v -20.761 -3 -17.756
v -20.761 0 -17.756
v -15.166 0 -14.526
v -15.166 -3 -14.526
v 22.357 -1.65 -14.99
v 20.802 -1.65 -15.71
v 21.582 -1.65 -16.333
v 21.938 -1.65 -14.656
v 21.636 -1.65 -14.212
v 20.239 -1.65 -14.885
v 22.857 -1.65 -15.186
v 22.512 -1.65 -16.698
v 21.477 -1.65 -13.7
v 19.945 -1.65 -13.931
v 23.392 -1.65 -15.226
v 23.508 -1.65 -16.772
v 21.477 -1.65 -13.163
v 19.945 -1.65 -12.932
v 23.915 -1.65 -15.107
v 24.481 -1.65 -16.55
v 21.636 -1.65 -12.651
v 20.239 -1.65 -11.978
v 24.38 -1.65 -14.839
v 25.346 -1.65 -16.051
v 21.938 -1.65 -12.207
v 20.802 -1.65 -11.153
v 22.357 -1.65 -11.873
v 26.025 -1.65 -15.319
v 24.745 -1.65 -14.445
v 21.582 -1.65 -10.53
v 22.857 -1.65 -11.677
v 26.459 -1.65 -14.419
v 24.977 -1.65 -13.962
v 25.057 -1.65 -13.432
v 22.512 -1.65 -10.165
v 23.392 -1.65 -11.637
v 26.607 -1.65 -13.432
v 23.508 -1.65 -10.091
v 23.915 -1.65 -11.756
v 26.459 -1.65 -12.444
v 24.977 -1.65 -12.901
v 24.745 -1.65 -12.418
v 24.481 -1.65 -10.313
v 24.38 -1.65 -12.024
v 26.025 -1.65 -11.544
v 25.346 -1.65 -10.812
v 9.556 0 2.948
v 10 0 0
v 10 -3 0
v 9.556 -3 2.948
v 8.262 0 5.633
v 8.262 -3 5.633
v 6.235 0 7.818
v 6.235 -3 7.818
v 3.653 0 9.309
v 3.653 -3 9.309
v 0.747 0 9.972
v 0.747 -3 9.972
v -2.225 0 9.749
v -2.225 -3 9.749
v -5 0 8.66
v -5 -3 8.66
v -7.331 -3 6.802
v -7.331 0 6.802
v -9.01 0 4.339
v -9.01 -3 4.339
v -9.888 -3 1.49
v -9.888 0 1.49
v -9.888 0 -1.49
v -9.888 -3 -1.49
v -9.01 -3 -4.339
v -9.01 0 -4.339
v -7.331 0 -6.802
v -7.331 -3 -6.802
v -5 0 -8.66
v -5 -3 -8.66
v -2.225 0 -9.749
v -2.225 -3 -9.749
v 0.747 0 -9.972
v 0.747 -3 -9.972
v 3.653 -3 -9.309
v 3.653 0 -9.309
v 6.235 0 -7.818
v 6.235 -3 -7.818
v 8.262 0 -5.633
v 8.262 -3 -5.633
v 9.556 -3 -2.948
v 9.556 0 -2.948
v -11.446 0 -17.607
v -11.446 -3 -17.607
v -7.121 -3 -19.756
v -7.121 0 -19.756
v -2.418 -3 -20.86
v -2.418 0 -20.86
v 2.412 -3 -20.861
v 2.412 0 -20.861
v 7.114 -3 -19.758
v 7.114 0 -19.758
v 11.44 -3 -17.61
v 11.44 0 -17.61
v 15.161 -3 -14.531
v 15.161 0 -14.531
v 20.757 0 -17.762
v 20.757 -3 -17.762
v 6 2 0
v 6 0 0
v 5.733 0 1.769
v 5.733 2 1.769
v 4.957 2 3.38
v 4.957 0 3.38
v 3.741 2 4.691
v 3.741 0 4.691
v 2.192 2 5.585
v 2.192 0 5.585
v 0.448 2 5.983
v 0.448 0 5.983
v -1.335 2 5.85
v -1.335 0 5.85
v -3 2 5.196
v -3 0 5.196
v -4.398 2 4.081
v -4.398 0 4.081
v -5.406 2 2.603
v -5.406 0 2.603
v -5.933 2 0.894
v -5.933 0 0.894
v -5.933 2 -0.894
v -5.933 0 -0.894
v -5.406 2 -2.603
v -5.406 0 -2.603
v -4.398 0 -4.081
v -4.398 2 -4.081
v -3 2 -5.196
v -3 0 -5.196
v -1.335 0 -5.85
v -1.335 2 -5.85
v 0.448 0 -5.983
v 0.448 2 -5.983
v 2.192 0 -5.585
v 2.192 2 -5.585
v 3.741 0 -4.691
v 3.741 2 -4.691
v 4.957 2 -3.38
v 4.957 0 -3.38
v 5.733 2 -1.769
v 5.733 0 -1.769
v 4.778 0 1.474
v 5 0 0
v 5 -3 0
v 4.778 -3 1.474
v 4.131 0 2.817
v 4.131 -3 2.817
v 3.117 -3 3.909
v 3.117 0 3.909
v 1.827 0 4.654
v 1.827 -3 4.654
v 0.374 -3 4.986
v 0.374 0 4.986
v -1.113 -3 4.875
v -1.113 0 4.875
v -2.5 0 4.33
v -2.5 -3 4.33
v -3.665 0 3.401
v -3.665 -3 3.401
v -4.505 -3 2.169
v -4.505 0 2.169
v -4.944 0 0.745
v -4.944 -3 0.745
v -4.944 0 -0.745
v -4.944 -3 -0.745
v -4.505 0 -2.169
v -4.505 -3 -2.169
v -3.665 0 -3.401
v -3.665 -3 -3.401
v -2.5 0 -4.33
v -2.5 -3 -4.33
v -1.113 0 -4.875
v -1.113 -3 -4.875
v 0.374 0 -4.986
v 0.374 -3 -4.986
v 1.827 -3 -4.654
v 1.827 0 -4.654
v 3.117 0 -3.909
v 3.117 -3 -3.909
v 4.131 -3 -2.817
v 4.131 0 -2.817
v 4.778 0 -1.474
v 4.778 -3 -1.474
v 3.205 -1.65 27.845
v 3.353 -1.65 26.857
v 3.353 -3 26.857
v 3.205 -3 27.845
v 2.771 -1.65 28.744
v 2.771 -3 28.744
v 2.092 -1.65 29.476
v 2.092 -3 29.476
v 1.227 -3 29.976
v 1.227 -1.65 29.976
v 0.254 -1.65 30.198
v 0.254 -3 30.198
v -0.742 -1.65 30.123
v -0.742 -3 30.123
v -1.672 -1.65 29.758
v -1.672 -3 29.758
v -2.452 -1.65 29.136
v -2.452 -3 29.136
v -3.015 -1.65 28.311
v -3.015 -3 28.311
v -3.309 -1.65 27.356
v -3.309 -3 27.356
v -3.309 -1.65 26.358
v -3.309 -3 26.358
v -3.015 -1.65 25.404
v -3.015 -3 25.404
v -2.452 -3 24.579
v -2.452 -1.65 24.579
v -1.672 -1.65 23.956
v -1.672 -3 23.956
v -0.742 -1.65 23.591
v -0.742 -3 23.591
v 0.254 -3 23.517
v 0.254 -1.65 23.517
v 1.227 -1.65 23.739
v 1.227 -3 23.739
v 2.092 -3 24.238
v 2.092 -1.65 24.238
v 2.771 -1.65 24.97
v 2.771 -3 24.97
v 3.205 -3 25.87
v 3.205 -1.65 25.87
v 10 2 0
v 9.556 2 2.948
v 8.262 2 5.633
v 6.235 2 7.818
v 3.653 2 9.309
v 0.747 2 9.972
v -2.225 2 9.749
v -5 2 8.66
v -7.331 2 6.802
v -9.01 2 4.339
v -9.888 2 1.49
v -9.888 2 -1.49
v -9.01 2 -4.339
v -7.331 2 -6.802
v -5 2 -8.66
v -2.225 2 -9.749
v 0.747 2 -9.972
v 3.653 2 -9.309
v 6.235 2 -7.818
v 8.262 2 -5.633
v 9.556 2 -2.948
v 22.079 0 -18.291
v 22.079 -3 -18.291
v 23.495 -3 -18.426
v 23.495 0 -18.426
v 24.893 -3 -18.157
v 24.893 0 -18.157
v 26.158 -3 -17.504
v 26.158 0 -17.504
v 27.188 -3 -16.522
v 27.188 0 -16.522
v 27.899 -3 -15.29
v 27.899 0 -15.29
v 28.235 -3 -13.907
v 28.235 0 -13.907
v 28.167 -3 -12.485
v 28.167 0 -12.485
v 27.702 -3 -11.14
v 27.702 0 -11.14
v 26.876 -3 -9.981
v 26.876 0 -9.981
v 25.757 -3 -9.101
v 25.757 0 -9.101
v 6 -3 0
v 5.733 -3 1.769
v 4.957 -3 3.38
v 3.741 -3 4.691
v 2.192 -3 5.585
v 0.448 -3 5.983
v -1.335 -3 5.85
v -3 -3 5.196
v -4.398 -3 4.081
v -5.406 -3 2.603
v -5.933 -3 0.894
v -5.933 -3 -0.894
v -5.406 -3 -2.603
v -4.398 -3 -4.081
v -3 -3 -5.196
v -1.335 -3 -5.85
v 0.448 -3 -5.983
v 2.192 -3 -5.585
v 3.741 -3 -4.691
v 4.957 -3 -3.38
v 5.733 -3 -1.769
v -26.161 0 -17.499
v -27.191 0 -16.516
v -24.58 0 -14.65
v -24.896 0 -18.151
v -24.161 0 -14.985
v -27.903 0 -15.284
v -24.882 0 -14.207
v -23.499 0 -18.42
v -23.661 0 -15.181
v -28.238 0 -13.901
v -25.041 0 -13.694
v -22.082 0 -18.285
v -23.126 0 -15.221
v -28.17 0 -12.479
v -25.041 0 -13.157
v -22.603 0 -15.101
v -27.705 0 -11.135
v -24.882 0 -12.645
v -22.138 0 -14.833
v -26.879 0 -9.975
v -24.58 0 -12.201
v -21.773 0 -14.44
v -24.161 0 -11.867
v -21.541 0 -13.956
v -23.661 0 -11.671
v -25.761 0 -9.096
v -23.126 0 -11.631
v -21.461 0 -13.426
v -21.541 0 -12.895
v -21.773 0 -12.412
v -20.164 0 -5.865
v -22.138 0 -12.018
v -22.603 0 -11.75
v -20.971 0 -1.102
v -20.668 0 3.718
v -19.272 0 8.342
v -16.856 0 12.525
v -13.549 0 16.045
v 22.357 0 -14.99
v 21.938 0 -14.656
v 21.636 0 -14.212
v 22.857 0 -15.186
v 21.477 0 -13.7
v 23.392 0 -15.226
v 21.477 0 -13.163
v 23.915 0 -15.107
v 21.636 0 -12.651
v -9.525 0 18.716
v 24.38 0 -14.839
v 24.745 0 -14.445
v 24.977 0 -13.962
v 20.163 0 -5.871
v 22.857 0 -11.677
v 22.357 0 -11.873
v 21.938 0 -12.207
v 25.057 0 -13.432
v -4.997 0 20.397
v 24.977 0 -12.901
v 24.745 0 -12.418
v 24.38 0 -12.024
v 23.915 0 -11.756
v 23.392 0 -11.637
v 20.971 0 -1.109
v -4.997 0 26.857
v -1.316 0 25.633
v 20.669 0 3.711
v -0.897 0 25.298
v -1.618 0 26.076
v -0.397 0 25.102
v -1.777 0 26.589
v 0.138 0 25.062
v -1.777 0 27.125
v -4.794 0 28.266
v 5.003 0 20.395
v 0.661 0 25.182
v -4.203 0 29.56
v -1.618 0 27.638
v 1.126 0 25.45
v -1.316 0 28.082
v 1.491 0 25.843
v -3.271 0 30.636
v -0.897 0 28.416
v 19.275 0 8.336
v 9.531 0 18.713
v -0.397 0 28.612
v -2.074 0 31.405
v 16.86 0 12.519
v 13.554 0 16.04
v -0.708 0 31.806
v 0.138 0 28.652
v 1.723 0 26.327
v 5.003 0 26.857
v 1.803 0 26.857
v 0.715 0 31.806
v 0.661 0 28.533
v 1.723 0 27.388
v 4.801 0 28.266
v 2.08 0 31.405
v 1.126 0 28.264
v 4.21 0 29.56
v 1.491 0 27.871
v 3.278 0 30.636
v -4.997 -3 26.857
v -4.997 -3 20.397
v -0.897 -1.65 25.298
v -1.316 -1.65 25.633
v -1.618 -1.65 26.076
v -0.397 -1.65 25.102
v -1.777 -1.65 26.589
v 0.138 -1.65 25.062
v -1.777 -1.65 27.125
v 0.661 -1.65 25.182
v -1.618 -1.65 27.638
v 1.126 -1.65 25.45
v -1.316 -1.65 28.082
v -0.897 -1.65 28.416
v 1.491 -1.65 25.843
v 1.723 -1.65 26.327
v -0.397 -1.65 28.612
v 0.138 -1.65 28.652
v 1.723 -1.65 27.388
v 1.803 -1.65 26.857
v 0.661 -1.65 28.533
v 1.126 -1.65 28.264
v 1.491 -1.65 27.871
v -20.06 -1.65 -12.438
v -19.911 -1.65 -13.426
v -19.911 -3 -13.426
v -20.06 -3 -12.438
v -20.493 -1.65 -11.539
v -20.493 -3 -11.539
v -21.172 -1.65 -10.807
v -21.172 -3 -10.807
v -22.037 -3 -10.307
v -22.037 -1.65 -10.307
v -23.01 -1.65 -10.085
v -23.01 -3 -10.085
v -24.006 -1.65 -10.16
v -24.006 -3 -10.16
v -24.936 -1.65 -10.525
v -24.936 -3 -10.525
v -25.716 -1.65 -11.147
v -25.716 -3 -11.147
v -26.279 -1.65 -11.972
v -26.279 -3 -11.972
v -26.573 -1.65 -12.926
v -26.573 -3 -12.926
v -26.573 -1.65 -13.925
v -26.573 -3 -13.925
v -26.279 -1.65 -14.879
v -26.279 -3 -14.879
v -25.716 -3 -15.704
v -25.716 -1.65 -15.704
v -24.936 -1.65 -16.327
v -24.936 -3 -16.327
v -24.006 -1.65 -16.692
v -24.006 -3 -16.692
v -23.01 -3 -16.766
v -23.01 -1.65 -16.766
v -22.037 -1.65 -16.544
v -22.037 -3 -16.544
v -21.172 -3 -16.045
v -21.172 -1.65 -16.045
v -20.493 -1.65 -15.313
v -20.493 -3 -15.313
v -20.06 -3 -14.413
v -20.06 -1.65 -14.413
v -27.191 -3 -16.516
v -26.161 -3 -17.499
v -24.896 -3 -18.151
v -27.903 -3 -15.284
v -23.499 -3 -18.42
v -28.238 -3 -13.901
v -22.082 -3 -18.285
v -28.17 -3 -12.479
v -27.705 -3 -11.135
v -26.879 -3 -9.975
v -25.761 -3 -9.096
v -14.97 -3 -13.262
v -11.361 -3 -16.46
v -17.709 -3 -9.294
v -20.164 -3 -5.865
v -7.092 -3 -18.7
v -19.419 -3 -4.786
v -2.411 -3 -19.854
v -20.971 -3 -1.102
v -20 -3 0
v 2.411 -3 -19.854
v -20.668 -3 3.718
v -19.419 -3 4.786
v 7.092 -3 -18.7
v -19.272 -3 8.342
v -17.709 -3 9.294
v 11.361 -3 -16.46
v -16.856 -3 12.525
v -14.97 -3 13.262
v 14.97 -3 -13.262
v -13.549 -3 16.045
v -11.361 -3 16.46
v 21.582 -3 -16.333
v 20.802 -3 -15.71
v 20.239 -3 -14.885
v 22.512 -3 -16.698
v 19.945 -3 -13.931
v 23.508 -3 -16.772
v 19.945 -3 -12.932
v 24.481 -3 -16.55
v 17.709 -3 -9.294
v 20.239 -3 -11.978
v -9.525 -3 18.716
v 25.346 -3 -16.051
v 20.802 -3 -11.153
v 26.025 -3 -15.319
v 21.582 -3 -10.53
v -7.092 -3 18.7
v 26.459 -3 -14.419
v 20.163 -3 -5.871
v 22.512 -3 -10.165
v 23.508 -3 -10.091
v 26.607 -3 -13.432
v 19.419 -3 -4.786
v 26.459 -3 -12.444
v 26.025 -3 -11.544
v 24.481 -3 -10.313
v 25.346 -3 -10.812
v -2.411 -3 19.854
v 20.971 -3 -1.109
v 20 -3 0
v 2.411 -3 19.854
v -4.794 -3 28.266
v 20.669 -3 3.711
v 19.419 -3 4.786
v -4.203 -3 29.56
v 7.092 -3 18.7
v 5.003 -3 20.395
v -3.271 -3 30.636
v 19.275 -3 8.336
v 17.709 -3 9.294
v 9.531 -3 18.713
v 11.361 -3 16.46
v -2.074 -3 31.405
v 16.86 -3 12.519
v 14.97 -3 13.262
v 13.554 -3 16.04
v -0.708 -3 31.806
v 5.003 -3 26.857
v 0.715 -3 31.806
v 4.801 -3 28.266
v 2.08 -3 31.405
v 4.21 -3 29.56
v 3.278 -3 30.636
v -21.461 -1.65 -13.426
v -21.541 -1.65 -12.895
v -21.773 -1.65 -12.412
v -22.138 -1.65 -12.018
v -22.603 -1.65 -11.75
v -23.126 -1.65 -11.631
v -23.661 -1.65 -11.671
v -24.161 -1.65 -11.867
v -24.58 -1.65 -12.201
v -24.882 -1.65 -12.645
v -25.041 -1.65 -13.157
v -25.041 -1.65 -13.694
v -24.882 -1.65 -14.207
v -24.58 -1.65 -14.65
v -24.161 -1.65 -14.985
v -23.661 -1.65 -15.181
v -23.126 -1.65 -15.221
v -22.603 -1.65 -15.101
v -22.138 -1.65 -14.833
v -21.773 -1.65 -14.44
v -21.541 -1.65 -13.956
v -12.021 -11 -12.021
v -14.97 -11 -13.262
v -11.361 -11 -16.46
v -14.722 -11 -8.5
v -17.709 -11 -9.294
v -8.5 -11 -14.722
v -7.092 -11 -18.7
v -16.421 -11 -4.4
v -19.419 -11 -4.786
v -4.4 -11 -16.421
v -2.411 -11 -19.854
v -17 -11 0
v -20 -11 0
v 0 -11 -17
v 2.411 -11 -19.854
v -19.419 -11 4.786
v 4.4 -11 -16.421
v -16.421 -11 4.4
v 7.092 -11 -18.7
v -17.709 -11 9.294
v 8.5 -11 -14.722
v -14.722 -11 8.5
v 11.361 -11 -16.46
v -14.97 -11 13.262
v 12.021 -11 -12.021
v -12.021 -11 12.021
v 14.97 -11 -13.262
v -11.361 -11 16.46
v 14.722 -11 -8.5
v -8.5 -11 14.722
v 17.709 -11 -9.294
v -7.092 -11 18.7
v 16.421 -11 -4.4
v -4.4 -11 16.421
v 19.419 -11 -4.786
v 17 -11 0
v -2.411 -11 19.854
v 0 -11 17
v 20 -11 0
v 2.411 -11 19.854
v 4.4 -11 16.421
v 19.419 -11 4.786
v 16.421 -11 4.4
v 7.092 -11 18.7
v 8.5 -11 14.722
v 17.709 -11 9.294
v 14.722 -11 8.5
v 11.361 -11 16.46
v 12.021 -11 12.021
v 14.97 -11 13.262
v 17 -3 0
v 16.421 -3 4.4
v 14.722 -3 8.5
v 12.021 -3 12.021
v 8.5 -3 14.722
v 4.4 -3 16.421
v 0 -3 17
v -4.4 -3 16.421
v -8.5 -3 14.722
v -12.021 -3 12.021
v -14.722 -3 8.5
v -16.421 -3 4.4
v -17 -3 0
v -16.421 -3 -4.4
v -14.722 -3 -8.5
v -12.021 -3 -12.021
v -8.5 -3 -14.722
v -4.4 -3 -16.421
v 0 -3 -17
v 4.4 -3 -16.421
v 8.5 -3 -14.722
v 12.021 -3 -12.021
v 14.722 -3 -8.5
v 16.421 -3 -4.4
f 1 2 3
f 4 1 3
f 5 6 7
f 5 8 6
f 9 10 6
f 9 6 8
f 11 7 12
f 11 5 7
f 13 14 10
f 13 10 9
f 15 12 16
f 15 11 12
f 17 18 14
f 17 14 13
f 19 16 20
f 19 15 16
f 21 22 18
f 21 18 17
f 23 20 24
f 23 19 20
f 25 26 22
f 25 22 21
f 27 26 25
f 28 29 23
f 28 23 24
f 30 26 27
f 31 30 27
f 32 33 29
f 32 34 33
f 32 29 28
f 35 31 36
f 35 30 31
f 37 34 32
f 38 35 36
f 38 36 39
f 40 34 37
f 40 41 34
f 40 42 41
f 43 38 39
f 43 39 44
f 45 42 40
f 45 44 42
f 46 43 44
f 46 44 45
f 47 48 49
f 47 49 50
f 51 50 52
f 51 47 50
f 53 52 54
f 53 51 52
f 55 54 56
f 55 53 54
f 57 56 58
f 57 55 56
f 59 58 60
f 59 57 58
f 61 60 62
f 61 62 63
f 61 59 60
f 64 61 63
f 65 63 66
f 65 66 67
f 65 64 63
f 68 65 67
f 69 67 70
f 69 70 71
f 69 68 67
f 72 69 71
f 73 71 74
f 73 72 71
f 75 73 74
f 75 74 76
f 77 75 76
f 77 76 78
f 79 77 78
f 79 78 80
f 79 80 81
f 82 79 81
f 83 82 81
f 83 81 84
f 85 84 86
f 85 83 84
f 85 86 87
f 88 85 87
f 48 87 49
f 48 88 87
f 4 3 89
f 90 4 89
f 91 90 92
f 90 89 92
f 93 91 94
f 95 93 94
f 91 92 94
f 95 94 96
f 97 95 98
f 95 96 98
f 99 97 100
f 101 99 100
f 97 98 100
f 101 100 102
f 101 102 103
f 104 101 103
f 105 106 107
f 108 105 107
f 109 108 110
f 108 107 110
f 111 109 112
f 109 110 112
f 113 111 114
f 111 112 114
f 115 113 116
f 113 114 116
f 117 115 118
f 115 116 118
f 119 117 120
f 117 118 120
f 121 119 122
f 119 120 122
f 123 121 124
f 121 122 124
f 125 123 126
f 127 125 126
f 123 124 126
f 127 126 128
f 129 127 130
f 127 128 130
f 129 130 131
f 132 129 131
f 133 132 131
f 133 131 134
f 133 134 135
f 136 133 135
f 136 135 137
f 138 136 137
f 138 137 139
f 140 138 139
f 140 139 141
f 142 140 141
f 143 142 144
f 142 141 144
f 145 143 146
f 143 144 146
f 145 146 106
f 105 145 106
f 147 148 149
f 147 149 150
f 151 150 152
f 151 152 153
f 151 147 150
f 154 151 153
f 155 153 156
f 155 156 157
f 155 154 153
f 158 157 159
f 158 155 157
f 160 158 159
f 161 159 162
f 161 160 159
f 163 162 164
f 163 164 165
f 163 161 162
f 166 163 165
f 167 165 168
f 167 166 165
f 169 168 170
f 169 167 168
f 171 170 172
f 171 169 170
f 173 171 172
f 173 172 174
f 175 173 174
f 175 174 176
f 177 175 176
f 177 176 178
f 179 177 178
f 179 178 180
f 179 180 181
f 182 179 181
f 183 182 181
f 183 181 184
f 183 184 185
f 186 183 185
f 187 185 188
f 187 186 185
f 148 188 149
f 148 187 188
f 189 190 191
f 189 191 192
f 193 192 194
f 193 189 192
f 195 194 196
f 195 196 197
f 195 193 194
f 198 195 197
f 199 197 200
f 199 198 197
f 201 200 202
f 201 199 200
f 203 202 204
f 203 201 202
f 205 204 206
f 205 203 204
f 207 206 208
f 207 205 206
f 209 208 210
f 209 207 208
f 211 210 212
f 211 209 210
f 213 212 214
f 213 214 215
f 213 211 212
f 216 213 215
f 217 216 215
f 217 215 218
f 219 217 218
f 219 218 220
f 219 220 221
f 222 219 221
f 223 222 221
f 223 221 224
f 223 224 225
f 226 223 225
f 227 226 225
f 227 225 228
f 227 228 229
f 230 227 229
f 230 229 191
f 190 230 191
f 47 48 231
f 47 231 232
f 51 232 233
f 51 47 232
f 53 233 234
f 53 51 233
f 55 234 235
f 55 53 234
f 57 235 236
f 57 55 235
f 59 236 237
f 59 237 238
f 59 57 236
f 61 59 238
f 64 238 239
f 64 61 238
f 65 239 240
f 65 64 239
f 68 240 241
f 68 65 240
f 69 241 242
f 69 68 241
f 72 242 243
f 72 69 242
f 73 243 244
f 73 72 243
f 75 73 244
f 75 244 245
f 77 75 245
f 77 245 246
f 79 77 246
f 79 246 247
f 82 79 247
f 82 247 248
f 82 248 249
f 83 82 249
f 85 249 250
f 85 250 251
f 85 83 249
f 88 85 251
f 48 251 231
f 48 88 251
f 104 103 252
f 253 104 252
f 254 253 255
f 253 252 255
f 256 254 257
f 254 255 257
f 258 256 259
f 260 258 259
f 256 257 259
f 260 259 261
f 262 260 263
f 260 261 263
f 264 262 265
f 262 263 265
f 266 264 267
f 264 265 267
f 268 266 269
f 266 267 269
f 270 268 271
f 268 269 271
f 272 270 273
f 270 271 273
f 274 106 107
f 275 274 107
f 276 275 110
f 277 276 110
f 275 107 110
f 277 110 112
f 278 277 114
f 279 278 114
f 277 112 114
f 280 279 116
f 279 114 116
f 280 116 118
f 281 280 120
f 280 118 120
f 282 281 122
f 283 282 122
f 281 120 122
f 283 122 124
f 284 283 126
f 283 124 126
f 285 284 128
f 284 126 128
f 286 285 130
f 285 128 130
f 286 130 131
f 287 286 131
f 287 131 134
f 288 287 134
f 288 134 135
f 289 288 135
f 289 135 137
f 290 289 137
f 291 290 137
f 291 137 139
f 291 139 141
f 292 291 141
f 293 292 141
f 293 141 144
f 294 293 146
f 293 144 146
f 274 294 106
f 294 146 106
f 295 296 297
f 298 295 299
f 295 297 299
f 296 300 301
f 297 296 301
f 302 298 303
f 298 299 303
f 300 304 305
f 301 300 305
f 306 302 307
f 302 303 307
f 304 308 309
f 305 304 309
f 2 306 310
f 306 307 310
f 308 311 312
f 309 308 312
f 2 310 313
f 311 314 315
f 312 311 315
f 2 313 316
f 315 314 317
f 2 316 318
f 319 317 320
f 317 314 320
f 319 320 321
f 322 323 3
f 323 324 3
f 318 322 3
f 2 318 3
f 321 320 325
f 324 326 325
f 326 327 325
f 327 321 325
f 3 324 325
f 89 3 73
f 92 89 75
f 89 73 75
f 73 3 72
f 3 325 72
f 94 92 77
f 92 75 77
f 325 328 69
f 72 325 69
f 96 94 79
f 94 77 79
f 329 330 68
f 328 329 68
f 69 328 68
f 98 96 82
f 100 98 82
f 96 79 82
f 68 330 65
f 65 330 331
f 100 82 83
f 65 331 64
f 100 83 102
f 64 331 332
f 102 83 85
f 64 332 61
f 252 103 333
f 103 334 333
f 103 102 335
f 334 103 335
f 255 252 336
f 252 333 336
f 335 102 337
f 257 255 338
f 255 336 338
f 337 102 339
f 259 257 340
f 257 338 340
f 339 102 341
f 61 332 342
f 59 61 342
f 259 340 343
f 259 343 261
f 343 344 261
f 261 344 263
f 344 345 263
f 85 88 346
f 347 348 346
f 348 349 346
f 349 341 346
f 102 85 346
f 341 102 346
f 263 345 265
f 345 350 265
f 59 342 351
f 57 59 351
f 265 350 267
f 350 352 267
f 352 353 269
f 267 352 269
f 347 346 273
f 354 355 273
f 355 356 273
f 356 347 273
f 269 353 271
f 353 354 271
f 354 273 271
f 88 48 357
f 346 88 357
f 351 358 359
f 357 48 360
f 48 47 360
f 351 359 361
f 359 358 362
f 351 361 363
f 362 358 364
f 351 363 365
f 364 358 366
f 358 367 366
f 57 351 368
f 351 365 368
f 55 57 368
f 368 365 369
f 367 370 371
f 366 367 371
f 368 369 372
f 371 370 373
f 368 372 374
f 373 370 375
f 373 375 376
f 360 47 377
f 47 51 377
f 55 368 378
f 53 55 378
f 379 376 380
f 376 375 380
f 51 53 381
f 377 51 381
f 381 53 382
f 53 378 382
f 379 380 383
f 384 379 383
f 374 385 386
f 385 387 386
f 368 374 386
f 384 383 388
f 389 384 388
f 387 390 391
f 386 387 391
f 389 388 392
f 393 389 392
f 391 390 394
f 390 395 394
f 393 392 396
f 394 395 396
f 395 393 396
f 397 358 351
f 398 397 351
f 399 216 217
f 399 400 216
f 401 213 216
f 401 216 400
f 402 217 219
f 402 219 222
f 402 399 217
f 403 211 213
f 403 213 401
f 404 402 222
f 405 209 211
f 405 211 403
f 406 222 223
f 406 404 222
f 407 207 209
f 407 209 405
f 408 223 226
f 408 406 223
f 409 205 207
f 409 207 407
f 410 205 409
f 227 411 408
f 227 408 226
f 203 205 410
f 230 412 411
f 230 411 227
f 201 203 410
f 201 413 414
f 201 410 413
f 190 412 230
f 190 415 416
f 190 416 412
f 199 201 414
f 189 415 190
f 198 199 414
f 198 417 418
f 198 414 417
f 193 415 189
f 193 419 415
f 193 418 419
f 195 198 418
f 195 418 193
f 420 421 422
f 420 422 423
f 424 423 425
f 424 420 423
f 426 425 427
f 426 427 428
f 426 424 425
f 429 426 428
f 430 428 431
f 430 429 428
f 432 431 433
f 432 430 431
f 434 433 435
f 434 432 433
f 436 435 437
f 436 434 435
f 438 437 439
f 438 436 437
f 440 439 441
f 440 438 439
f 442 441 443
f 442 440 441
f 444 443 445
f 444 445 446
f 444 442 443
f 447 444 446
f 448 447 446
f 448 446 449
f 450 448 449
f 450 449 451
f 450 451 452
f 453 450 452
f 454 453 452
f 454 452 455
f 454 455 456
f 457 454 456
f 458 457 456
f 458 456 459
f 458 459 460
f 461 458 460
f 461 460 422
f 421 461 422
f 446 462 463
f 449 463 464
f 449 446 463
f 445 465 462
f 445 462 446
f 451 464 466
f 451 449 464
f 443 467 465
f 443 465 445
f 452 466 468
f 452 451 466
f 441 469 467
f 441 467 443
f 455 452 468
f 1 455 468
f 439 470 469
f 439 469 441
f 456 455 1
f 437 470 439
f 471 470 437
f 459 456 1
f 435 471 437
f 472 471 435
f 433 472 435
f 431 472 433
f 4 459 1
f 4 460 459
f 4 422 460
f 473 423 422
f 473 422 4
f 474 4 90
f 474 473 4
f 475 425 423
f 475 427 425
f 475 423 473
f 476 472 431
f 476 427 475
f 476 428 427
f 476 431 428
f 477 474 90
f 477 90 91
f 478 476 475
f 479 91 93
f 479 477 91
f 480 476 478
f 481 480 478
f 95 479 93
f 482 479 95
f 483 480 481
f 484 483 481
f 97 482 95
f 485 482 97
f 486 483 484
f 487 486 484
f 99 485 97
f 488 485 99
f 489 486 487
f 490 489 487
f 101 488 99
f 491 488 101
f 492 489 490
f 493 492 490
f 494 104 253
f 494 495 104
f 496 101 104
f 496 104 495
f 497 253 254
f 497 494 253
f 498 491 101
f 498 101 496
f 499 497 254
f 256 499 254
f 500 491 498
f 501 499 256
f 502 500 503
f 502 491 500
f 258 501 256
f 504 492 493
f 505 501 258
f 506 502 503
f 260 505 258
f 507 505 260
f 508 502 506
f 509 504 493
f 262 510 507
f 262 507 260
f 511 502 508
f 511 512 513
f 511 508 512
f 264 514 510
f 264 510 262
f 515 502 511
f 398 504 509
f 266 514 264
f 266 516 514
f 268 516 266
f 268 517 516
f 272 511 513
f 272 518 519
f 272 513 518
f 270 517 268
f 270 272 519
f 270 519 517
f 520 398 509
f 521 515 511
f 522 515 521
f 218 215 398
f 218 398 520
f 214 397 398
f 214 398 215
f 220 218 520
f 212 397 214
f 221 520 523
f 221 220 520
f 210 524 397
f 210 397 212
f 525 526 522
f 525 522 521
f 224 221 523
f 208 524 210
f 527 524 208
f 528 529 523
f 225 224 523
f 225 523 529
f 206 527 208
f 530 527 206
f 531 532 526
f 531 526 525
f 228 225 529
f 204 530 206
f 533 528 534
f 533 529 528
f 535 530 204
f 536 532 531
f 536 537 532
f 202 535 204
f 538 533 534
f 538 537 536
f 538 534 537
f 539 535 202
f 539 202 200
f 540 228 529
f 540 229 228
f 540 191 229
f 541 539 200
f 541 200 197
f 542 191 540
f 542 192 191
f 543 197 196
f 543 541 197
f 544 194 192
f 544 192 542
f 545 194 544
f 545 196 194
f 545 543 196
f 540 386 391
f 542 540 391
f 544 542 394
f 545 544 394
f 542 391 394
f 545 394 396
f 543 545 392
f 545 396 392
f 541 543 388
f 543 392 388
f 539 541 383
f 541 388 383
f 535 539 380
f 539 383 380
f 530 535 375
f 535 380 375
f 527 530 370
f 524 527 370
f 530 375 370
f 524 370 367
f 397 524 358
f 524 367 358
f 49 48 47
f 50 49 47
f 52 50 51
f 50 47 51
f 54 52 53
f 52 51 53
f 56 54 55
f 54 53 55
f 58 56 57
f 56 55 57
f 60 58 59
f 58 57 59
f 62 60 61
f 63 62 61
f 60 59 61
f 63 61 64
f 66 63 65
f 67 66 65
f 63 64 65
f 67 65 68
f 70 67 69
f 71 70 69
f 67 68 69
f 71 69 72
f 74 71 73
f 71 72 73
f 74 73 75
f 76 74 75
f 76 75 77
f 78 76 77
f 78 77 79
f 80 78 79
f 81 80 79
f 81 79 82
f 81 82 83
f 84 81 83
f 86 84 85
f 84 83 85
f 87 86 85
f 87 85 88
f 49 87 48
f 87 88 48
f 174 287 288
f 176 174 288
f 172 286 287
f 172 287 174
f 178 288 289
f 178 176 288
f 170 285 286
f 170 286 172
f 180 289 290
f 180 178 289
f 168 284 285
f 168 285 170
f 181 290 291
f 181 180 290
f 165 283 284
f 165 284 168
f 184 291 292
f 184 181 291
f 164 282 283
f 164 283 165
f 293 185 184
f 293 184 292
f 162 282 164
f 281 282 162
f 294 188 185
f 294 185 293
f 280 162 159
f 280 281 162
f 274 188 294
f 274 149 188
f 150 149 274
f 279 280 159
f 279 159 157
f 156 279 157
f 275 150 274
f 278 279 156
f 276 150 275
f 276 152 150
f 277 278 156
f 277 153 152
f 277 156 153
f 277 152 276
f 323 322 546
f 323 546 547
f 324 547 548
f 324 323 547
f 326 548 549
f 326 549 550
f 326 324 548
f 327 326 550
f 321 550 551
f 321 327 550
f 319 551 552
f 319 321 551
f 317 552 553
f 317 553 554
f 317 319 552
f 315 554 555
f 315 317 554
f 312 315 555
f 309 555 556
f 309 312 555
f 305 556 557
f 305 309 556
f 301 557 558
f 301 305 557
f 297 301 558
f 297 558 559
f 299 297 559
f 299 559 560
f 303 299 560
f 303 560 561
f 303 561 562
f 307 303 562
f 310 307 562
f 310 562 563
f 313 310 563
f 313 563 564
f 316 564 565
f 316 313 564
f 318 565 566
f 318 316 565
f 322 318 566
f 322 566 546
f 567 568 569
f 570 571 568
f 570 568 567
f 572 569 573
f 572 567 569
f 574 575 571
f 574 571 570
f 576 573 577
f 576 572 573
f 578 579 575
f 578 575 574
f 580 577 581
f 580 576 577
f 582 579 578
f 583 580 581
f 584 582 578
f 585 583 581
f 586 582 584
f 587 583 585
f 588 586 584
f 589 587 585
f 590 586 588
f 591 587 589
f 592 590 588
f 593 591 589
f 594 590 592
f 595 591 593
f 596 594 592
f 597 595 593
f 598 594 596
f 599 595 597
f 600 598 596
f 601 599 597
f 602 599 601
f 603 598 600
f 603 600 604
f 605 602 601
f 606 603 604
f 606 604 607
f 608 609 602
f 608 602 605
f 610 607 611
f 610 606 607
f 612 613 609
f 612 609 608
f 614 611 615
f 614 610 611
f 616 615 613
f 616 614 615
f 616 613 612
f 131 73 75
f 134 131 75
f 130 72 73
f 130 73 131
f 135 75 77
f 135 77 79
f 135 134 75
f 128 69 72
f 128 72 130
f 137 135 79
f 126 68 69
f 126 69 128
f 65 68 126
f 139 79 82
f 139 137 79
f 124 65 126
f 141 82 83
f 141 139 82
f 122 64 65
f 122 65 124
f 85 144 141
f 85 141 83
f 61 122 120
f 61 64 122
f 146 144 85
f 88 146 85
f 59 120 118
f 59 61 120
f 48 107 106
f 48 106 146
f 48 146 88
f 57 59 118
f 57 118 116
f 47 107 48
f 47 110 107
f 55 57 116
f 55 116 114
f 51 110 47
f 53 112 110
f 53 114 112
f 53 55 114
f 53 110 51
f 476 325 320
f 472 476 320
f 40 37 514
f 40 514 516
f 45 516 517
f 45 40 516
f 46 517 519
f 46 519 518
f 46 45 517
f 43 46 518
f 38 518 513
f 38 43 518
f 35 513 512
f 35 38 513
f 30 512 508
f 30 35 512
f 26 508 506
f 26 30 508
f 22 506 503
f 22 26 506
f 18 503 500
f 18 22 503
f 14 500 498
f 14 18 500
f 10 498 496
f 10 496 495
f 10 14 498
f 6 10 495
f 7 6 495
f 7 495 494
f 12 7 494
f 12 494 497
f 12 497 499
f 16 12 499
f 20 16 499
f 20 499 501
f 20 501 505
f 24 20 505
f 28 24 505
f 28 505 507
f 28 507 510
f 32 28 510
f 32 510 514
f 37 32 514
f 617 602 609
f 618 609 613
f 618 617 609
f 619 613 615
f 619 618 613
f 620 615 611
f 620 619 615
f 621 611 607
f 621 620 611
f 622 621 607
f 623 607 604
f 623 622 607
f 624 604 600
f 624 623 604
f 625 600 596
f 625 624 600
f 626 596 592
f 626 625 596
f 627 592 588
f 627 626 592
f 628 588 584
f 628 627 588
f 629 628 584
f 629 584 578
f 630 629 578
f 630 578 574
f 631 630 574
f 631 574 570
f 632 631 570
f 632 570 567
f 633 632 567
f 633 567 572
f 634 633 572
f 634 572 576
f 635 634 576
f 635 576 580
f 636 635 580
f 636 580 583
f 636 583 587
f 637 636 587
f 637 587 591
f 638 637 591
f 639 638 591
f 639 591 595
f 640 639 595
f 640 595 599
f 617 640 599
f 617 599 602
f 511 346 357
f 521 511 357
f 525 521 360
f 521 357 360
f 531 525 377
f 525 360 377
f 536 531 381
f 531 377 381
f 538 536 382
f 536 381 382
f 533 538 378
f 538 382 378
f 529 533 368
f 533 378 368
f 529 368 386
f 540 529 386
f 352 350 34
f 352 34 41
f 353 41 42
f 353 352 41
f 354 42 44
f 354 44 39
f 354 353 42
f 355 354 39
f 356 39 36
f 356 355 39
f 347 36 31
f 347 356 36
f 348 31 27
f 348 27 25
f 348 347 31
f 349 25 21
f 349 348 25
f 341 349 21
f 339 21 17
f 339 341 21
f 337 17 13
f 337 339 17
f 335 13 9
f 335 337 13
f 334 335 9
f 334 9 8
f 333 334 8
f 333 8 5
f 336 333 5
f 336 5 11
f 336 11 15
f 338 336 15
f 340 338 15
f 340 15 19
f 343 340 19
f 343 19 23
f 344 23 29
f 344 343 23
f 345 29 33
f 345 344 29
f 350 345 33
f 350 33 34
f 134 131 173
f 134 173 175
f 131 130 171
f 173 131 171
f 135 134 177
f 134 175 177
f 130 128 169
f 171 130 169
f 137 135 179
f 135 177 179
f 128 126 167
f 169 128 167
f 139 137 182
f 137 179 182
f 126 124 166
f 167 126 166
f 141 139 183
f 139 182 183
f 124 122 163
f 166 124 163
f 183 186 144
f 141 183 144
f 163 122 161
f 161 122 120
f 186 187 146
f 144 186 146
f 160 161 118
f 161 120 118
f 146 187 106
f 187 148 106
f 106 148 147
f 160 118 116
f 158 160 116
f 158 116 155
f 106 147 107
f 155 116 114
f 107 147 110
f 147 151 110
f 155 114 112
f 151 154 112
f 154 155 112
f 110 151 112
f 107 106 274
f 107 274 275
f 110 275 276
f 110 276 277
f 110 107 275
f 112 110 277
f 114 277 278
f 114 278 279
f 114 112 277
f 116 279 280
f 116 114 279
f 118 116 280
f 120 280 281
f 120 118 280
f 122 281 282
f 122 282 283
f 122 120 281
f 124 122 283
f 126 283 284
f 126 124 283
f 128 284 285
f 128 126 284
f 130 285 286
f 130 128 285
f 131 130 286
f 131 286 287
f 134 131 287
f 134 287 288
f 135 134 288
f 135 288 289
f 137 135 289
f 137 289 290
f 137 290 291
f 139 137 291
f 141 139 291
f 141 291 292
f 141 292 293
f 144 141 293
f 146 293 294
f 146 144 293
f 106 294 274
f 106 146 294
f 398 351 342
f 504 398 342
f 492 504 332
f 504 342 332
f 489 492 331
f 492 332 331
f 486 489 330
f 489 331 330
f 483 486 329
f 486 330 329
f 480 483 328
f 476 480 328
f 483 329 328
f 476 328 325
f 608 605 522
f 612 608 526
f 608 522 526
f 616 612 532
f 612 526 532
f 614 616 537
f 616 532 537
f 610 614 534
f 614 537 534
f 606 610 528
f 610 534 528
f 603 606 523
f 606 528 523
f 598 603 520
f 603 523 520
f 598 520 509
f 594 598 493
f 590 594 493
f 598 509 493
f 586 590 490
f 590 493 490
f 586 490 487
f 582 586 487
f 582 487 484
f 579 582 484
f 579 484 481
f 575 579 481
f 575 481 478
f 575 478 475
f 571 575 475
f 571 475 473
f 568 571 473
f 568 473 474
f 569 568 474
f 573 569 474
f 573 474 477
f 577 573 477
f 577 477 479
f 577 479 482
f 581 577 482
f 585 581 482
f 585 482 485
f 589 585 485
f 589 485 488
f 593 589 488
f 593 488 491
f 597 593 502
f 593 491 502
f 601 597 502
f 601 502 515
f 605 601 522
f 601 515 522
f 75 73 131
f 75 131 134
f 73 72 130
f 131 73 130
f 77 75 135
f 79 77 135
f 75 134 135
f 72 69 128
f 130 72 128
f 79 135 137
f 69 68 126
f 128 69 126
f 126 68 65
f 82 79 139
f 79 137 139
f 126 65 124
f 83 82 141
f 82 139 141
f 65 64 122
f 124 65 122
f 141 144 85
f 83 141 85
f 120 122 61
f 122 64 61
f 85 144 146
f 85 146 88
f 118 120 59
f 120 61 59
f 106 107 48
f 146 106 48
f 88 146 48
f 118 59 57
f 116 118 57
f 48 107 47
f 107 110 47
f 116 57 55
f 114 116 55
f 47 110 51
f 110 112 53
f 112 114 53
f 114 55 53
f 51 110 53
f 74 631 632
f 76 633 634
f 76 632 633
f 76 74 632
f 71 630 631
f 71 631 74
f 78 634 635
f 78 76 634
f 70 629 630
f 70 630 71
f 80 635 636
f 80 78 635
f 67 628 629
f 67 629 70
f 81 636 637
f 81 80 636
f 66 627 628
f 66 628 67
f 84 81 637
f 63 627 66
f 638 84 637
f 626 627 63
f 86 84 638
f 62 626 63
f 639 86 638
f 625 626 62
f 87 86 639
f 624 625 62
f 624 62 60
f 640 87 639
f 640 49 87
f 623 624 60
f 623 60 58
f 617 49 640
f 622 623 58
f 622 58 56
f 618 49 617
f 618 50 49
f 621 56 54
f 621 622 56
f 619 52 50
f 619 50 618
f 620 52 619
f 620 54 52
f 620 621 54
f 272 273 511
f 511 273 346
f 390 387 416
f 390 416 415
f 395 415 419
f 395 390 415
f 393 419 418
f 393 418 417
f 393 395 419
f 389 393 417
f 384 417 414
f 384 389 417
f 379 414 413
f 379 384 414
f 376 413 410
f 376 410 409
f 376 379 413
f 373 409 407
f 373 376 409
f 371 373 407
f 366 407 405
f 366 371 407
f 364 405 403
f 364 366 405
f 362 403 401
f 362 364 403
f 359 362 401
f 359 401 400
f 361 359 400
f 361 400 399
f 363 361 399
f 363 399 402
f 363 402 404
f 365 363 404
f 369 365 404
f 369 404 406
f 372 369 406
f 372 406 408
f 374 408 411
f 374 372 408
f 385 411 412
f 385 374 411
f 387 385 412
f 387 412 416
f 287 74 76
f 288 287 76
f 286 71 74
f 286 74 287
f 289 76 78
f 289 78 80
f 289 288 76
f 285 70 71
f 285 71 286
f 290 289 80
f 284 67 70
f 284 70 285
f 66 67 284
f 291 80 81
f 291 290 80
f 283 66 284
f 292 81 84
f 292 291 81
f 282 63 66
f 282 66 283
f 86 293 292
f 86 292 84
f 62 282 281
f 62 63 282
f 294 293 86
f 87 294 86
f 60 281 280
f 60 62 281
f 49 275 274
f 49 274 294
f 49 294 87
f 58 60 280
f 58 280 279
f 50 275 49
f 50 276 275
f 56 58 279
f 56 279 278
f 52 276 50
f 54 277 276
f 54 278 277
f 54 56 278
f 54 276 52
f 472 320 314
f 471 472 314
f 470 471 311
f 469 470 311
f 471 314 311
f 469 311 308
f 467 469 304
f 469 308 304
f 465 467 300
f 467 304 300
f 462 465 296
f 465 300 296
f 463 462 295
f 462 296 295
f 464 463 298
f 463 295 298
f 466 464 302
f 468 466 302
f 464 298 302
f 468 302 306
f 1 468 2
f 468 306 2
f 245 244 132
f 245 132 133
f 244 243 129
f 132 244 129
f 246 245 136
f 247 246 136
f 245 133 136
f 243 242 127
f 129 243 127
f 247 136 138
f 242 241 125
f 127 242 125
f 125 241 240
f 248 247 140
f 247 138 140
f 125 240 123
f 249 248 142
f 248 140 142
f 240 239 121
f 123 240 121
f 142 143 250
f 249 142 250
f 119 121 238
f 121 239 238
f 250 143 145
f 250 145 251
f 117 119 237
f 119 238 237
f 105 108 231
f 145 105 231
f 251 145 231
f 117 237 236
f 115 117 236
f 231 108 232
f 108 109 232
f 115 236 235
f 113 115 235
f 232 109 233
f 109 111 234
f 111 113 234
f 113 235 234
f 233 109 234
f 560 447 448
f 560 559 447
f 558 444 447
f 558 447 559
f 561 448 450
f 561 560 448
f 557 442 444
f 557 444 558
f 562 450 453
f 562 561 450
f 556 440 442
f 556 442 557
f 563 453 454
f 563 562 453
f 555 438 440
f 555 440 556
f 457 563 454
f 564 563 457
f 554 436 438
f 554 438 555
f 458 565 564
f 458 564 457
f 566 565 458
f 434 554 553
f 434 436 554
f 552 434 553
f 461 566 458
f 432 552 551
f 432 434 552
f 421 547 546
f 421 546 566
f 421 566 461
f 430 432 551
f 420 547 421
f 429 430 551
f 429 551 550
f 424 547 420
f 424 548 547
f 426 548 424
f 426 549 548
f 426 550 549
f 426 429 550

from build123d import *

# Parameters (mm, degrees)
F0_R     = 3.35
F0_R_2   = 20
F0_R_3   = 17
F0_R_4   = 10
F1_DEPTH = 3
F0_R_5   = 6
F0_R_6   = 5
F2_DEPTH = 11
F0_R_7   = 1.8
F3_DEPTH = 1.65
F4_DEPTH = 2
F5_DEPTH = 3


with BuildPart() as f1:
    # F0 (on Front) → F1 (new body)
    with BuildSketch(Plane.XZ):
        with BuildLine():
            Line((-4.9966446176, 26.8572020554), (-4.9966446176, 20.3969003176))
            ThreePointArc((-4.9966446176, 20.3969003176), (-18.1848058662, 10.5029917456), (-20.1644868163, -5.8645947376))
            Line((-20.1644868163, -5.8645947376), (-25.7606969458, -9.0955681624))
            ThreePointArc((-25.7606969458, -9.0955681624), (-27.5908239647, -15.9256951813), (-20.7606969458, -17.7558222002))
            Line((-20.7606969458, -17.7558222002), (-15.1659115247, -14.5256713313))
            ThreePointArc((-15.1659115247, -14.5256713313), (-0.0034547343, -20.9999997158), (15.1611314338, -14.5306604683))
            Line((15.1611314338, -14.5306604683), (20.7573415633, -17.7616338931))
            ThreePointArc((20.7573415633, -17.7616338931), (27.5874685823, -15.9315068741), (25.7573415633, -9.1013798552))
            Line((25.7573415633, -9.1013798552), (20.1625561423, -5.8712289863))
            ThreePointArc((20.1625561423, -5.8712289863), (18.1882606005, 10.4970079702), (5.0033553824, 20.395255206))
            Line((5.0033553824, 20.395255206), (5.0033553824, 26.8572020554))
            ThreePointArc((5.0033553824, 26.8572020554), (0.0033553824, 31.8572020554), (-4.9966446176, 26.8572020554))
        make_face()
        with Locations((-23.2606969458, -13.4256951813)):
            Circle(F0_R, mode=Mode.SUBTRACT)
        with Locations((23.2573415633, -13.4315068741)):
            Circle(F0_R, mode=Mode.SUBTRACT)
        Circle(F0_R_2, mode=Mode.SUBTRACT)
        with Locations((0.0033553824, 26.8572020554)):
            Circle(F0_R, mode=Mode.SUBTRACT)
        Circle(F0_R_2)
        Circle(F0_R_3, mode=Mode.SUBTRACT)
        Circle(F0_R_3)
        Circle(F0_R_4, mode=Mode.SUBTRACT)
    extrude(amount=F1_DEPTH)

    # F0 (on Front) → F2 (join)
    with BuildSketch(Plane.XZ):
        Circle(F0_R_2)
        Circle(F0_R_3, mode=Mode.SUBTRACT)
    extrude(amount=F2_DEPTH)

    # F0 (on Front) → F3 (join)
    with BuildSketch(Plane.XZ):
        with Locations((0.0033553824, 26.8572020554)):
            Circle(F0_R)
        with Locations((0.0033553824, 26.8572020554)):
            Circle(F0_R_7, mode=Mode.SUBTRACT)
        with Locations((23.2573415633, -13.4315068741)):
            Circle(F0_R)
        with Locations((23.2573415633, -13.4315068741)):
            Circle(F0_R_7, mode=Mode.SUBTRACT)
        with Locations((-23.2606969458, -13.4256951813)):
            Circle(F0_R)
        with Locations((-23.2606969458, -13.4256951813)):
            Circle(F0_R_7, mode=Mode.SUBTRACT)
    extrude(amount=F3_DEPTH)


with BuildPart() as f1b:
    # F0 (on Front) → F1, piece 2 (new body)
    with BuildSketch(Plane.XZ):
        Circle(F0_R_5)
        Circle(F0_R_6, mode=Mode.SUBTRACT)
    extrude(amount=F1_DEPTH)


with BuildPart() as f4:
    # F0 (on Front) → F4 (new body)
    with BuildSketch(Plane.XZ):
        Circle(F0_R_4)
        Circle(F0_R_5, mode=Mode.SUBTRACT)
    extrude(amount=-F4_DEPTH)


with BuildPart() as f5:
    # F5 (new): a face of the model
    f5_faces = [f4.part.faces().sort_by_distance(p)[0] for p in [
        (-9.7171572875, 0, 0),
    ]]
    extrude(f5_faces, amount=F5_DEPTH)


solid = Compound([f1.part, f1b.part, f4.part, f5.part])
